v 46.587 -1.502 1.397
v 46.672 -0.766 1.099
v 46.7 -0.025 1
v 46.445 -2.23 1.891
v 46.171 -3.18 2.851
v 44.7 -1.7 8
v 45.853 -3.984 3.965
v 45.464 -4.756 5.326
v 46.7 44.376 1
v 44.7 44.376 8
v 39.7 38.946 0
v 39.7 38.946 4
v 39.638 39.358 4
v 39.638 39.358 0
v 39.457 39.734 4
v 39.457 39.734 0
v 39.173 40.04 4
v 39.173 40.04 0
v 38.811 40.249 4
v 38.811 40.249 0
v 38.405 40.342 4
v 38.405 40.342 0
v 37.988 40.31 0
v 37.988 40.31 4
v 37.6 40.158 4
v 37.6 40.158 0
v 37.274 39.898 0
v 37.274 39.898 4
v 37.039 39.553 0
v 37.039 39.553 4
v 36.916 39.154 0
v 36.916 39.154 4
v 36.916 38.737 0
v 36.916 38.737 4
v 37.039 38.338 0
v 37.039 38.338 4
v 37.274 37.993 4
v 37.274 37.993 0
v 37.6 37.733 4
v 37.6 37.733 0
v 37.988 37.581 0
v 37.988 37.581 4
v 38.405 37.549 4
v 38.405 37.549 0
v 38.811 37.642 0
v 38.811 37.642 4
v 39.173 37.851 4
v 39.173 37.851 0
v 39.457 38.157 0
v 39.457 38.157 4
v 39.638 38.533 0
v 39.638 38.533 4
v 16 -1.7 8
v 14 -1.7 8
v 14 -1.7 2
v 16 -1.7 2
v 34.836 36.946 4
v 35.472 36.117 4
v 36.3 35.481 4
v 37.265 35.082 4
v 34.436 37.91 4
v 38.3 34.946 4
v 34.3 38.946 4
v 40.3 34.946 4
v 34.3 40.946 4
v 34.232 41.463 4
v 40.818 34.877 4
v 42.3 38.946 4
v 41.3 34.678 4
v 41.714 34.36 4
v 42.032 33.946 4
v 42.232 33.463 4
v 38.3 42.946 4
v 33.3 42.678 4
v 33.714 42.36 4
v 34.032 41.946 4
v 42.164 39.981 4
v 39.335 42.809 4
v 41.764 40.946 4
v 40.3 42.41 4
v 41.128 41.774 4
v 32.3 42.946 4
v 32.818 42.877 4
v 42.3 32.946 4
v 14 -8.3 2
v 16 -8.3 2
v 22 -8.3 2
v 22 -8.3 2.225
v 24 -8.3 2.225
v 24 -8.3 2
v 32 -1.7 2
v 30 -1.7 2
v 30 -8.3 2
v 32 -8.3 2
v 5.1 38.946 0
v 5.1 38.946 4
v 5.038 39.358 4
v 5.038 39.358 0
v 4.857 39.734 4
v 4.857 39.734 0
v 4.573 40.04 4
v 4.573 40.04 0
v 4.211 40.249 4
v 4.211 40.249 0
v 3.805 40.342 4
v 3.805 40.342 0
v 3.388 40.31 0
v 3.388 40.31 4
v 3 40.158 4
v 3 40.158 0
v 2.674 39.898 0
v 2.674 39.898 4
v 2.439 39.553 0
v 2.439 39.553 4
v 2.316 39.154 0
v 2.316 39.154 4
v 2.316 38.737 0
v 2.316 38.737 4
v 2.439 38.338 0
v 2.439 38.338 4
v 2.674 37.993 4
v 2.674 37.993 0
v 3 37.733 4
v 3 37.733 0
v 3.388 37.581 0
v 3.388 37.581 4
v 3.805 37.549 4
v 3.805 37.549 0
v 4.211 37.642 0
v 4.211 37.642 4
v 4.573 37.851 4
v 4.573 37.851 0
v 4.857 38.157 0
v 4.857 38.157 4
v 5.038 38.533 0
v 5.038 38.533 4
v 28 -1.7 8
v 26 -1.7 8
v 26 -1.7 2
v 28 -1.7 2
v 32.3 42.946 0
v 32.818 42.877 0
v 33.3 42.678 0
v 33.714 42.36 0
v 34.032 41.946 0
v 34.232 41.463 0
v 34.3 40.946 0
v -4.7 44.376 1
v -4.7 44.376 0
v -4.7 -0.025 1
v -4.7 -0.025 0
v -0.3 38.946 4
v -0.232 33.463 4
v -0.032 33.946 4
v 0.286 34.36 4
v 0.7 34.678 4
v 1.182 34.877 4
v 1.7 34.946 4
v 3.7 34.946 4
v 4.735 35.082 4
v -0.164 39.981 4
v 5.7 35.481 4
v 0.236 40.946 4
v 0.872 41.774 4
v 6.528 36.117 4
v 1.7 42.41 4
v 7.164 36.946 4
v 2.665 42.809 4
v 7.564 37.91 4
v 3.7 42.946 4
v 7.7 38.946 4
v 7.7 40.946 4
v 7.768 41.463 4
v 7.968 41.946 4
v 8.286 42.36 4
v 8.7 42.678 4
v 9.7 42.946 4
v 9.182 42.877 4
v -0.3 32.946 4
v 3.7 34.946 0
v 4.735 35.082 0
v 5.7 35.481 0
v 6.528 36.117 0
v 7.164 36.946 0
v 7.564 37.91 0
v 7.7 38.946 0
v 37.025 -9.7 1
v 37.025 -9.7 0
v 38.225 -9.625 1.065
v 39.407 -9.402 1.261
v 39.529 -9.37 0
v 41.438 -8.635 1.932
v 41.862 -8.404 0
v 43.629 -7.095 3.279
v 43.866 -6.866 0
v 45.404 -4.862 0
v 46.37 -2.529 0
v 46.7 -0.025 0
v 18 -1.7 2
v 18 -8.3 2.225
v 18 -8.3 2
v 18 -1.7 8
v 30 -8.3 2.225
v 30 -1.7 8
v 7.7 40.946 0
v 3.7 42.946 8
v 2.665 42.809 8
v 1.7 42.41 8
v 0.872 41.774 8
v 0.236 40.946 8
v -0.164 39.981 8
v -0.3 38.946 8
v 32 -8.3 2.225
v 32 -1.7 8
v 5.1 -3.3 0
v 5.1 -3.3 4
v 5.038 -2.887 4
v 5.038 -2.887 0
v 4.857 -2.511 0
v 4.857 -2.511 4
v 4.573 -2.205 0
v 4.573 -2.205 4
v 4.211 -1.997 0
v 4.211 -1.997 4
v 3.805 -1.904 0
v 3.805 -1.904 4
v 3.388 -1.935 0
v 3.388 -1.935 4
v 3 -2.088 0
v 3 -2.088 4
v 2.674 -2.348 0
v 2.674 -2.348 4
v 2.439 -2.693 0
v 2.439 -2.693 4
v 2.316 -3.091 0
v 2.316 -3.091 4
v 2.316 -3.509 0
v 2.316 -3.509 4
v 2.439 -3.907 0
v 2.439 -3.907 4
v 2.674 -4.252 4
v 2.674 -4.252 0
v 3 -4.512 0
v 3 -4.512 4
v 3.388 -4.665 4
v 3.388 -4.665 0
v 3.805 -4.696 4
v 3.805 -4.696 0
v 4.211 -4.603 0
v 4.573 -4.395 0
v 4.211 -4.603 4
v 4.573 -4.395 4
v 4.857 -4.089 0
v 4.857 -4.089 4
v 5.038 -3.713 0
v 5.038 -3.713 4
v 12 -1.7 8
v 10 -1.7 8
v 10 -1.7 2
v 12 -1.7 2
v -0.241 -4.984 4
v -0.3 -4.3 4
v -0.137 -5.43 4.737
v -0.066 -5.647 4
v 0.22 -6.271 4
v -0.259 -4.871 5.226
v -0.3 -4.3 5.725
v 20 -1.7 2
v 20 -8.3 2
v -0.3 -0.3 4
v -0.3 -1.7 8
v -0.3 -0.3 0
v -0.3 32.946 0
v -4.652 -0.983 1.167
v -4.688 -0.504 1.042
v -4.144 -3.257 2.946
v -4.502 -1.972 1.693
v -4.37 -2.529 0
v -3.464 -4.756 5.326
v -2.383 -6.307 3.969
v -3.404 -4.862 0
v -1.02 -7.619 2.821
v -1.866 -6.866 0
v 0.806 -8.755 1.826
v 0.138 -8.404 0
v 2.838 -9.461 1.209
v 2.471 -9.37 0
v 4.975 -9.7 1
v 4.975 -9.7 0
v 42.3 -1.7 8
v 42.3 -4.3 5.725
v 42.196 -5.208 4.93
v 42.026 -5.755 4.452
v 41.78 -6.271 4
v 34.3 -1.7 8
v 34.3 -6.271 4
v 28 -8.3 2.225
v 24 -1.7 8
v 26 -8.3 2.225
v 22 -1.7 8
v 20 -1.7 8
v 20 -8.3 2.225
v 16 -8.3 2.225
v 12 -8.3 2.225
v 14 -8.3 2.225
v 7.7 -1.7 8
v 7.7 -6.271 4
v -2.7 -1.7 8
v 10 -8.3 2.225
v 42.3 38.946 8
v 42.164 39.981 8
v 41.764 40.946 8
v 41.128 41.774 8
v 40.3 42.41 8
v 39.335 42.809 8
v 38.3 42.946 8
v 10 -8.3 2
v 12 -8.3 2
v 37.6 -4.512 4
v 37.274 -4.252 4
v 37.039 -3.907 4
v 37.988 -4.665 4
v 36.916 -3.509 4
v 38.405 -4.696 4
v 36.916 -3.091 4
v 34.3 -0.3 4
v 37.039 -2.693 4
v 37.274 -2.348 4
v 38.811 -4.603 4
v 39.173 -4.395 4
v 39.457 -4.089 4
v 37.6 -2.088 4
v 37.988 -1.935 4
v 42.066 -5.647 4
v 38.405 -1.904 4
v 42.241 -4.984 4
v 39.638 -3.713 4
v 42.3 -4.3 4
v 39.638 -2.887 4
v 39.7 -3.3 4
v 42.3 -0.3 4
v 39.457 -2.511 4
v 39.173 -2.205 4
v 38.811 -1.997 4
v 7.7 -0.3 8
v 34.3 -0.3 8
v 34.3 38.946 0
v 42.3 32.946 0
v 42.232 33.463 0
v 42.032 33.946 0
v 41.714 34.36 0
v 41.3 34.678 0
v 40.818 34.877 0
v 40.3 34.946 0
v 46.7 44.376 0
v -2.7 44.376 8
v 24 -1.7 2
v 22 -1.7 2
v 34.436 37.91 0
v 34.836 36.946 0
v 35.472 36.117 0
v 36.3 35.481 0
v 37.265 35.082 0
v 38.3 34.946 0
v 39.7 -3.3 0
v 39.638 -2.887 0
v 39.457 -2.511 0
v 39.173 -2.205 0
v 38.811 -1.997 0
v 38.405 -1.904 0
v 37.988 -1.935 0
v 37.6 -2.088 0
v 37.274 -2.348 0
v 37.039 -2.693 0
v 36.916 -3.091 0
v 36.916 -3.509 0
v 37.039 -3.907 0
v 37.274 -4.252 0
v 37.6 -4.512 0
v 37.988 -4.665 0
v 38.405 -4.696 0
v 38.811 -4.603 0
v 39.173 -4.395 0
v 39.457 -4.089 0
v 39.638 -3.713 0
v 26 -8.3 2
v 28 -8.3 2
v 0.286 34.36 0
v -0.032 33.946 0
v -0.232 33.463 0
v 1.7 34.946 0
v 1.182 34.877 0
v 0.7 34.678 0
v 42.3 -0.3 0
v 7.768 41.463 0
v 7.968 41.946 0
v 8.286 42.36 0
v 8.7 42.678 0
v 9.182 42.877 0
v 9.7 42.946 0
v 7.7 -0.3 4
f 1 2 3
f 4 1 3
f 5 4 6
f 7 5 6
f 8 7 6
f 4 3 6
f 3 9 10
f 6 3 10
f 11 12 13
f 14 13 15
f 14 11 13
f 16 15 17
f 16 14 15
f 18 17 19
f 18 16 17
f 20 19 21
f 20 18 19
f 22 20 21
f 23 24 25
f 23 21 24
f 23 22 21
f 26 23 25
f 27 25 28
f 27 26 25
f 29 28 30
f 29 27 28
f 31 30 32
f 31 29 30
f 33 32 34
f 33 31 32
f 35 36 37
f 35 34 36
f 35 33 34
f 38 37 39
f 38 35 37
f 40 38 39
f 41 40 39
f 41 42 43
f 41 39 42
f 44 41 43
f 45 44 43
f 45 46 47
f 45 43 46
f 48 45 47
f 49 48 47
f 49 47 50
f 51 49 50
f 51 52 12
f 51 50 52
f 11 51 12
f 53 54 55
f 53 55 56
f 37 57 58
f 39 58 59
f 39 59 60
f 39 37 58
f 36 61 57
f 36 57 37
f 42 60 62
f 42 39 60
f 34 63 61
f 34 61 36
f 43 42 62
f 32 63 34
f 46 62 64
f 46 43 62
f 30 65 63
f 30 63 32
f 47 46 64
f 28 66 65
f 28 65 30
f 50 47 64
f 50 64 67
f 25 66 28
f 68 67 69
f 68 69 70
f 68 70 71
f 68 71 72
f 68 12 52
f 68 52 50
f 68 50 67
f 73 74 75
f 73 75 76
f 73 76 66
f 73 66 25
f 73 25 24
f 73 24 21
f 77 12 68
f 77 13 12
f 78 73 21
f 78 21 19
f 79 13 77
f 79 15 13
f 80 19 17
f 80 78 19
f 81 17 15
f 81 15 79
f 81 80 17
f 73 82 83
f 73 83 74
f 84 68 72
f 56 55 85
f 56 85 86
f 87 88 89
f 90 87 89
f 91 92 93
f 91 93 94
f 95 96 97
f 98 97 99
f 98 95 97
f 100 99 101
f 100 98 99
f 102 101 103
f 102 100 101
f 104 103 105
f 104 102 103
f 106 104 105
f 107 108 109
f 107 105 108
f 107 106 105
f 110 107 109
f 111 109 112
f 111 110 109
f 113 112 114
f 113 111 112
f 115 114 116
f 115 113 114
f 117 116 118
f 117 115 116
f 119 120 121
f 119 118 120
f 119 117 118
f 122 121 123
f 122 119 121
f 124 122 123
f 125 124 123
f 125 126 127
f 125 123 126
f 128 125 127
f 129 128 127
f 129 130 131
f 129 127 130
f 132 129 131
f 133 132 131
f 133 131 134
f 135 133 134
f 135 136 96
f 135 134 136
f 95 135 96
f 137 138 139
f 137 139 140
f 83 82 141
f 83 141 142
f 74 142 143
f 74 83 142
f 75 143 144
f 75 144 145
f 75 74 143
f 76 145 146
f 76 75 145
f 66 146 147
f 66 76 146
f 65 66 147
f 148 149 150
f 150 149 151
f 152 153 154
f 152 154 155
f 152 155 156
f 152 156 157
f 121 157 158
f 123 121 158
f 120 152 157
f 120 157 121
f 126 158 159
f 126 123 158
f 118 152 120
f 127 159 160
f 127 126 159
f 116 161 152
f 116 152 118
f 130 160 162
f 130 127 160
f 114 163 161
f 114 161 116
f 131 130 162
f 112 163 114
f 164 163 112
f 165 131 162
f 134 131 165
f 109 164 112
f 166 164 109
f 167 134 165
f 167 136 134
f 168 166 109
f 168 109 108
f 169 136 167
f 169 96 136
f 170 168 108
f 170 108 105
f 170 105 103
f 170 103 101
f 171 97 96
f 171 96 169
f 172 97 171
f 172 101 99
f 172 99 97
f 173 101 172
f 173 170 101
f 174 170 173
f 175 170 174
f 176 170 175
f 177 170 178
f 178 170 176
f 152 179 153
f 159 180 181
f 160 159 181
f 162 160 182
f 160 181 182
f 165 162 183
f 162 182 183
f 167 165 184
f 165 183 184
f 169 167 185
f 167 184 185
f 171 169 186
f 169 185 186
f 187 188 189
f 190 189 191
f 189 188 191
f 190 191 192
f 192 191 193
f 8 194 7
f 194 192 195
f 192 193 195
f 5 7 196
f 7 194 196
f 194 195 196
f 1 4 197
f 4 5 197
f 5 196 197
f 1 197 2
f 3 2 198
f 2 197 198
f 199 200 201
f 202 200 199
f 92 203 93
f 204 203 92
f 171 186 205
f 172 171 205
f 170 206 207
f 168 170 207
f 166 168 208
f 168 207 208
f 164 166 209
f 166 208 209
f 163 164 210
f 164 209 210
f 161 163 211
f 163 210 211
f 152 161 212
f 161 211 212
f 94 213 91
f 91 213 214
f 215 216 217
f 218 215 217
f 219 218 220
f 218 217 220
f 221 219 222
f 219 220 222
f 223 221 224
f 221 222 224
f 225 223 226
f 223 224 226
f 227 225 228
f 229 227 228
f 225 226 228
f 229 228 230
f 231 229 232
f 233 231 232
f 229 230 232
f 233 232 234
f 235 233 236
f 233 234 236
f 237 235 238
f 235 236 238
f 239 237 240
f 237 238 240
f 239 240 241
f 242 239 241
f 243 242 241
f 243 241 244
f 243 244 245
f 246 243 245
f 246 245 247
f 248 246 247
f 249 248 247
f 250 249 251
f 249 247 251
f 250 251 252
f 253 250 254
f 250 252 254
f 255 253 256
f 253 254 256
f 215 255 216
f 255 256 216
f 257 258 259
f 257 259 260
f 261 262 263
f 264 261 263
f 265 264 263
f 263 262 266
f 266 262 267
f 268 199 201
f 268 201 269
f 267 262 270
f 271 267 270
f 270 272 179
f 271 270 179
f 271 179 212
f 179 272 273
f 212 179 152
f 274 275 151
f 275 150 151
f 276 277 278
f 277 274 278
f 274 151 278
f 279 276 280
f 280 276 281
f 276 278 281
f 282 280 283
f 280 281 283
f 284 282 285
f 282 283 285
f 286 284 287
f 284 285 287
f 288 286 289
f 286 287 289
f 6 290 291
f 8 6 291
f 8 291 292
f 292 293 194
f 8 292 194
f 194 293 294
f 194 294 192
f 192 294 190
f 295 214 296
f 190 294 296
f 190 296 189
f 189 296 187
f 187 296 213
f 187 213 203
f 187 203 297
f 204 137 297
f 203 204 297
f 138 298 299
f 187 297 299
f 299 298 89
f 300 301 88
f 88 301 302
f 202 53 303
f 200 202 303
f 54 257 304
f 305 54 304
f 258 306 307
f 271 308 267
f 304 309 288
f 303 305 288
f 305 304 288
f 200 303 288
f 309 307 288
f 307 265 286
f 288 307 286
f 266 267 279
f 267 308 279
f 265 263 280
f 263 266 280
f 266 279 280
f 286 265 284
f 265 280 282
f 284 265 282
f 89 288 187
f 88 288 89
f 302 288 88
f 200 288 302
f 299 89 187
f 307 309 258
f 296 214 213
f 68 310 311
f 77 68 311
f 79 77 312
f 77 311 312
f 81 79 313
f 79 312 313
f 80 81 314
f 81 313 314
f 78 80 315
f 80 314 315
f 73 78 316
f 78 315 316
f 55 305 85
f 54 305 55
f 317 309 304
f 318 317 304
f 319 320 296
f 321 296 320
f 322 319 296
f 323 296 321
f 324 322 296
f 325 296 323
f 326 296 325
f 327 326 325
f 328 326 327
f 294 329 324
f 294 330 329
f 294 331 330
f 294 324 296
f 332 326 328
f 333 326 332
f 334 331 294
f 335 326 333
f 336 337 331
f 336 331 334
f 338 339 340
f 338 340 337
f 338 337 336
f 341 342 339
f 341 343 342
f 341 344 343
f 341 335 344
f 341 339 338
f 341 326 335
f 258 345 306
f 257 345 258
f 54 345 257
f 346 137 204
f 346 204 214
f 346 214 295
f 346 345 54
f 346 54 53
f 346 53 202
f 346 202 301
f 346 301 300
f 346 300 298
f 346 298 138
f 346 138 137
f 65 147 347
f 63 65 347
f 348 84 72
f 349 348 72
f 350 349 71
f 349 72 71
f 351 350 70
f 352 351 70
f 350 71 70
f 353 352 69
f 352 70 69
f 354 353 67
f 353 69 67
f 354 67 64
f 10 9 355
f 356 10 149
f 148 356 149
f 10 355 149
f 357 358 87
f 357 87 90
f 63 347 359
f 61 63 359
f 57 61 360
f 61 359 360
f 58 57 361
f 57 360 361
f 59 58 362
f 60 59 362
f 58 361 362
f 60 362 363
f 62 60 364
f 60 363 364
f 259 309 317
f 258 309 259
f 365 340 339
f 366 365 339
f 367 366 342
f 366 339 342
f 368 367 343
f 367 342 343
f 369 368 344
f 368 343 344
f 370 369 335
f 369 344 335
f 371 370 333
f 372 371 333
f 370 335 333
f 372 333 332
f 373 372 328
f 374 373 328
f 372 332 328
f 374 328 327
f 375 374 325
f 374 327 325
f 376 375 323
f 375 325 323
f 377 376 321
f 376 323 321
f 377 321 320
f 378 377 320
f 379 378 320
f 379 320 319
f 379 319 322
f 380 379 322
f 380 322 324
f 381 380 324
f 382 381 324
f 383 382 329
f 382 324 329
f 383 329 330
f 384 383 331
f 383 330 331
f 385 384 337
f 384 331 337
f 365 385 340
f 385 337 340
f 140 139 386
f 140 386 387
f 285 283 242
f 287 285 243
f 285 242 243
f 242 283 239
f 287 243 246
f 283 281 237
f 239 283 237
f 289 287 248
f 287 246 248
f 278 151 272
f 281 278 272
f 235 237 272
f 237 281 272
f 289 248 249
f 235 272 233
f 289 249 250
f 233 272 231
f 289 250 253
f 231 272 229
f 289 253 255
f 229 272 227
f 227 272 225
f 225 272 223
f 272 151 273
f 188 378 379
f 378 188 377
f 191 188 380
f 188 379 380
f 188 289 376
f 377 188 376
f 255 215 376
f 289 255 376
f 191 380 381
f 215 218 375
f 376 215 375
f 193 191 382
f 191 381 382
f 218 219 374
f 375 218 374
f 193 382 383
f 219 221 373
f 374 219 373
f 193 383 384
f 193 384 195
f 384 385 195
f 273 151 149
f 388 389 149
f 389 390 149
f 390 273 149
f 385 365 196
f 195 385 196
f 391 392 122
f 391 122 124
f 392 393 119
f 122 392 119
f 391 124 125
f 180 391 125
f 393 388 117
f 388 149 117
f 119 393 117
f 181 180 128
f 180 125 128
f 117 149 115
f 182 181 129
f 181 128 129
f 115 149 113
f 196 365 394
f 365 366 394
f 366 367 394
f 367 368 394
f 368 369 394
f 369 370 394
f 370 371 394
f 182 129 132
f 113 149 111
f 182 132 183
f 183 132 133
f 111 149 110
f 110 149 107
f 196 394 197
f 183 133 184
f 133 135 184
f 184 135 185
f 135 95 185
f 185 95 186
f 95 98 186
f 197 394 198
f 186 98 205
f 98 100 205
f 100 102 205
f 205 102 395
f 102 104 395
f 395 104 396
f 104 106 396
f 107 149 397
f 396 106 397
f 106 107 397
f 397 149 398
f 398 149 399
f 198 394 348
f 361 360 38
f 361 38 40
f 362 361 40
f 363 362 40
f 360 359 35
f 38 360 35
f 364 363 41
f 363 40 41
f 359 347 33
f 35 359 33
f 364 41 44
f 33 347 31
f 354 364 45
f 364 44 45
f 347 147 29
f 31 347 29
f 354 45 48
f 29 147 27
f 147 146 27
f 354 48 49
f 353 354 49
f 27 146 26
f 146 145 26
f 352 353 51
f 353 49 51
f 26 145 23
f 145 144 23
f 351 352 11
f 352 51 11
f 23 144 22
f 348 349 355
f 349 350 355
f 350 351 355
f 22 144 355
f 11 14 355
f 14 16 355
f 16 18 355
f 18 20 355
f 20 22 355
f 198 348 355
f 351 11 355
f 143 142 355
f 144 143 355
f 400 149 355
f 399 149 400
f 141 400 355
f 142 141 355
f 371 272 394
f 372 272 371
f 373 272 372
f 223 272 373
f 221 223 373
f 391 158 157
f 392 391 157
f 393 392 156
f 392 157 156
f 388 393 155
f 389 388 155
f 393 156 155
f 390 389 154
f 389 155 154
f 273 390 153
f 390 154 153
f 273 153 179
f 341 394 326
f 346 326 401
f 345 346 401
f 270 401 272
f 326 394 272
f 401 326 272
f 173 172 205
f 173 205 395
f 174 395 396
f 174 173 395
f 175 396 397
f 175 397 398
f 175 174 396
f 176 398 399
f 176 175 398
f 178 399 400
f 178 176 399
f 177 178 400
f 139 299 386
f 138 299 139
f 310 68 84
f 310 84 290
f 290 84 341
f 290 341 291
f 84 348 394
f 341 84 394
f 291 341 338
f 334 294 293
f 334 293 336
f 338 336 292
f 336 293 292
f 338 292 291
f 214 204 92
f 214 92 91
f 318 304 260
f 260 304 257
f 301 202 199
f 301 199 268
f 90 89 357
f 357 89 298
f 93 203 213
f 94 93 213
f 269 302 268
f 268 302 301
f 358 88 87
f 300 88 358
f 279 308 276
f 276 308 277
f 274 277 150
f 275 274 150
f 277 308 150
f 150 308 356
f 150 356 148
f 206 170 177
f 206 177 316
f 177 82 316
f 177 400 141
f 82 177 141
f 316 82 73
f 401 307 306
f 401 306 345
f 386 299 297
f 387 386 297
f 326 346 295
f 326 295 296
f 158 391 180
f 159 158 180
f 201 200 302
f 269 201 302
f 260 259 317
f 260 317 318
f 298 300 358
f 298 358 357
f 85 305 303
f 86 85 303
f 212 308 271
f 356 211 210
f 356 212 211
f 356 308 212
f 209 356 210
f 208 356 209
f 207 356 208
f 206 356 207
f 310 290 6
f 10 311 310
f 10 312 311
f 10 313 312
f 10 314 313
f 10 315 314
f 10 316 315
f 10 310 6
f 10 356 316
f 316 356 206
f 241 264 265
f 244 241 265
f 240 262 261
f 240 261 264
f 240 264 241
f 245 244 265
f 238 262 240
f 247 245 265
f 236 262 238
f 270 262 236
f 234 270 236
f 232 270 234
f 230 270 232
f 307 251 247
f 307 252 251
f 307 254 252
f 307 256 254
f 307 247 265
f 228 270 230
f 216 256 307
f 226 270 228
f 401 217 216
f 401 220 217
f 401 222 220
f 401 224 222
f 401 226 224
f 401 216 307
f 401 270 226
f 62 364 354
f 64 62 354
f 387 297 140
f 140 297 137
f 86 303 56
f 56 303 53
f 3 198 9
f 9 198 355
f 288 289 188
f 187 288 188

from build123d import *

# Parameters (mm, degrees)
F0_R      = 1.4
F1_DEPTH  = 8
F3_DEPTH  = 54.07728
F5_DEPTH  = 51.401
F6_R      = 2
F8_DEPTH  = 4
F9_R      = 1.4
F10_DEPTH = 4
F11_W     = 2
F11_H     = 6.6
F12_DEPTH = 6


with BuildPart() as f1:
    # F0 (on Top) → F1 (new body)
    with BuildSketch(Plane.XY):
        with BuildLine():
            Line((46.7, 44.37628), (-4.7, 44.37628))
            Line((-4.7, 44.37628), (-4.7, -0.02469))
            ThreePointArc((-4.7, -0.02469), (-1.8661673111, -6.8661673111), (4.97531, -9.7))
            Line((4.97531, -9.7), (37.02469, -9.7))
            ThreePointArc((37.02469, -9.7), (43.8661673111, -6.8661673111), (46.7, -0.02469))
            Line((46.7, -0.02469), (46.7, 44.37628))
        make_face()
        with BuildLine():
            Line((7.7, 38.94554), (7.7, 42.94554))
            Line((7.7, 42.94554), (34.3, 42.94554))
            Line((34.3, 42.94554), (34.3, 38.94554))
            ThreePointArc((34.3, 38.94554), (35.4715728753, 36.1171128753), (38.3, 34.94554))
            Line((38.3, 34.94554), (42.3, 34.94554))
            Line((42.3, 34.94554), (42.3, -0.3))
            Line((42.3, -0.3), (-0.3, -0.3))
            Line((-0.3, -0.3), (-0.3, 34.94554))
            Line((-0.3, 34.94554), (3.7, 34.94554))
            ThreePointArc((3.7, 34.94554), (6.5284271247, 36.1171128753), (7.7, 38.94554))
        make_face(mode=Mode.SUBTRACT)
        with Locations((3.7, 38.94554)):
            Circle(F0_R, mode=Mode.SUBTRACT)
        with Locations((38.3, 38.94554)):
            Circle(F0_R, mode=Mode.SUBTRACT)
    extrude(amount=F1_DEPTH)

    # F2 (on face) → F3 (cut, through all)
    with BuildSketch(Plane(origin=(0, 44.37628, 0), x_dir=(-1, 0, 0), z_dir=(0, 1, 0))):
        Polygon((4.7, 1), (4.7, 8), (2.7, 8), align=None)
        Polygon((-44.7, 8), (-46.7, 8), (-46.7, 1), align=None)
    extrude(amount=-F3_DEPTH, mode=Mode.SUBTRACT)

    # F4 (on face) → F5 (cut, through all)
    with BuildSketch(Plane(origin=(-4.7, 0, 0), x_dir=(0, -1, 0), z_dir=(-1, 0, 0))):
        Polygon((9.7, 8), (1.7, 8), (9.7, 1), align=None)
    extrude(amount=-F5_DEPTH, mode=Mode.SUBTRACT)

    # F6
    f6_edges = [f1.edges().sort_by_distance(p)[0] for p in [
        (7.7, 42.94554, 4),
        (34.3, 42.94554, 4),
        (42.3, 34.94554, 4),
        (-0.3, 34.94554, 4),
    ]]
    fillet(f6_edges, radius=F6_R)

    # F7 (on face) → F8 (cut)
    with BuildSketch(Plane.XY.offset(8)):
        with BuildLine():
            Line((9.7, 42.94554), (3.7, 42.94554))
            ThreePointArc((3.7, 42.94554), (0.8715728753, 41.7739671247), (-0.3, 38.94554))
            Line((-0.3, 38.94554), (-0.3, 32.94554))
            ThreePointArc((-0.3, 32.94554), (0.2857864376, 34.3597535624), (1.7, 34.94554))
            Line((1.7, 34.94554), (3.7, 34.94554))
            ThreePointArc((3.7, 34.94554), (6.5284271247, 36.1171128753), (7.7, 38.94554))
            Line((7.7, 38.94554), (7.7, 40.94554))
            ThreePointArc((7.7, 40.94554), (8.2857864376, 42.3597535624), (9.7, 42.94554))
        make_face()
        with BuildLine():
            Line((38.3, 42.94554), (32.3, 42.94554))
            ThreePointArc((32.3, 42.94554), (33.7142135624, 42.3597535624), (34.3, 40.94554))
            Line((34.3, 40.94554), (34.3, 38.94554))
            ThreePointArc((34.3, 38.94554), (35.4715728753, 36.1171128753), (38.3, 34.94554))
            Line((38.3, 34.94554), (40.3, 34.94554))
            ThreePointArc((40.3, 34.94554), (41.7142135624, 34.3597535624), (42.3, 32.94554))
            Line((42.3, 32.94554), (42.3, 38.94554))
            ThreePointArc((42.3, 38.94554), (41.1284271247, 41.7739671247), (38.3, 42.94554))
        make_face()
        with BuildLine():
            Line((7.7, -0.3), (-0.3, -0.3))
            Line((-0.3, -0.3), (-0.3, -4.3))
            ThreePointArc((-0.3, -4.3), (0.8715728753, -7.1284271247), (3.7, -8.3))
            Line((3.7, -8.3), (7.7, -8.3))
            Line((7.7, -8.3), (7.7, -0.3))
        make_face()
        with BuildLine():
            Line((42.3, -4.3), (42.3, -0.3))
            Line((42.3, -0.3), (34.3, -0.3))
            Line((34.3, -0.3), (34.3, -8.3))
            Line((34.3, -8.3), (38.3, -8.3))
            ThreePointArc((38.3, -8.3), (41.1284271247, -7.1284271247), (42.3, -4.3))
        make_face()
    extrude(amount=-F8_DEPTH, mode=Mode.SUBTRACT)

    # F9 (on face) → F10 (cut, through all)
    with BuildSketch(Plane.XY.offset(4)):
        with Locations((3.7, -3.3)):
            Circle(F9_R)
        with Locations((38.3, -3.3)):
            Circle(F9_R)
    extrude(amount=-F10_DEPTH, mode=Mode.SUBTRACT)

    # F11 (on face) → F12 (cut)
    with BuildSketch(Plane.XY.offset(8)):
        with Locations((11, -5)):
            Rectangle(F11_W, F11_H)
        with Locations((15, -5)):
            Rectangle(F11_W, F11_H)
        with Locations((19, -5)):
            Rectangle(F11_W, F11_H)
        with Locations((31, -5)):
            Rectangle(F11_W, F11_H)
        with Locations((27, -5)):
            Rectangle(F11_W, F11_H)
        with Locations((23, -5)):
            Rectangle(F11_W, F11_H)
    extrude(amount=-F12_DEPTH, mode=Mode.SUBTRACT)


solid = f1.part
